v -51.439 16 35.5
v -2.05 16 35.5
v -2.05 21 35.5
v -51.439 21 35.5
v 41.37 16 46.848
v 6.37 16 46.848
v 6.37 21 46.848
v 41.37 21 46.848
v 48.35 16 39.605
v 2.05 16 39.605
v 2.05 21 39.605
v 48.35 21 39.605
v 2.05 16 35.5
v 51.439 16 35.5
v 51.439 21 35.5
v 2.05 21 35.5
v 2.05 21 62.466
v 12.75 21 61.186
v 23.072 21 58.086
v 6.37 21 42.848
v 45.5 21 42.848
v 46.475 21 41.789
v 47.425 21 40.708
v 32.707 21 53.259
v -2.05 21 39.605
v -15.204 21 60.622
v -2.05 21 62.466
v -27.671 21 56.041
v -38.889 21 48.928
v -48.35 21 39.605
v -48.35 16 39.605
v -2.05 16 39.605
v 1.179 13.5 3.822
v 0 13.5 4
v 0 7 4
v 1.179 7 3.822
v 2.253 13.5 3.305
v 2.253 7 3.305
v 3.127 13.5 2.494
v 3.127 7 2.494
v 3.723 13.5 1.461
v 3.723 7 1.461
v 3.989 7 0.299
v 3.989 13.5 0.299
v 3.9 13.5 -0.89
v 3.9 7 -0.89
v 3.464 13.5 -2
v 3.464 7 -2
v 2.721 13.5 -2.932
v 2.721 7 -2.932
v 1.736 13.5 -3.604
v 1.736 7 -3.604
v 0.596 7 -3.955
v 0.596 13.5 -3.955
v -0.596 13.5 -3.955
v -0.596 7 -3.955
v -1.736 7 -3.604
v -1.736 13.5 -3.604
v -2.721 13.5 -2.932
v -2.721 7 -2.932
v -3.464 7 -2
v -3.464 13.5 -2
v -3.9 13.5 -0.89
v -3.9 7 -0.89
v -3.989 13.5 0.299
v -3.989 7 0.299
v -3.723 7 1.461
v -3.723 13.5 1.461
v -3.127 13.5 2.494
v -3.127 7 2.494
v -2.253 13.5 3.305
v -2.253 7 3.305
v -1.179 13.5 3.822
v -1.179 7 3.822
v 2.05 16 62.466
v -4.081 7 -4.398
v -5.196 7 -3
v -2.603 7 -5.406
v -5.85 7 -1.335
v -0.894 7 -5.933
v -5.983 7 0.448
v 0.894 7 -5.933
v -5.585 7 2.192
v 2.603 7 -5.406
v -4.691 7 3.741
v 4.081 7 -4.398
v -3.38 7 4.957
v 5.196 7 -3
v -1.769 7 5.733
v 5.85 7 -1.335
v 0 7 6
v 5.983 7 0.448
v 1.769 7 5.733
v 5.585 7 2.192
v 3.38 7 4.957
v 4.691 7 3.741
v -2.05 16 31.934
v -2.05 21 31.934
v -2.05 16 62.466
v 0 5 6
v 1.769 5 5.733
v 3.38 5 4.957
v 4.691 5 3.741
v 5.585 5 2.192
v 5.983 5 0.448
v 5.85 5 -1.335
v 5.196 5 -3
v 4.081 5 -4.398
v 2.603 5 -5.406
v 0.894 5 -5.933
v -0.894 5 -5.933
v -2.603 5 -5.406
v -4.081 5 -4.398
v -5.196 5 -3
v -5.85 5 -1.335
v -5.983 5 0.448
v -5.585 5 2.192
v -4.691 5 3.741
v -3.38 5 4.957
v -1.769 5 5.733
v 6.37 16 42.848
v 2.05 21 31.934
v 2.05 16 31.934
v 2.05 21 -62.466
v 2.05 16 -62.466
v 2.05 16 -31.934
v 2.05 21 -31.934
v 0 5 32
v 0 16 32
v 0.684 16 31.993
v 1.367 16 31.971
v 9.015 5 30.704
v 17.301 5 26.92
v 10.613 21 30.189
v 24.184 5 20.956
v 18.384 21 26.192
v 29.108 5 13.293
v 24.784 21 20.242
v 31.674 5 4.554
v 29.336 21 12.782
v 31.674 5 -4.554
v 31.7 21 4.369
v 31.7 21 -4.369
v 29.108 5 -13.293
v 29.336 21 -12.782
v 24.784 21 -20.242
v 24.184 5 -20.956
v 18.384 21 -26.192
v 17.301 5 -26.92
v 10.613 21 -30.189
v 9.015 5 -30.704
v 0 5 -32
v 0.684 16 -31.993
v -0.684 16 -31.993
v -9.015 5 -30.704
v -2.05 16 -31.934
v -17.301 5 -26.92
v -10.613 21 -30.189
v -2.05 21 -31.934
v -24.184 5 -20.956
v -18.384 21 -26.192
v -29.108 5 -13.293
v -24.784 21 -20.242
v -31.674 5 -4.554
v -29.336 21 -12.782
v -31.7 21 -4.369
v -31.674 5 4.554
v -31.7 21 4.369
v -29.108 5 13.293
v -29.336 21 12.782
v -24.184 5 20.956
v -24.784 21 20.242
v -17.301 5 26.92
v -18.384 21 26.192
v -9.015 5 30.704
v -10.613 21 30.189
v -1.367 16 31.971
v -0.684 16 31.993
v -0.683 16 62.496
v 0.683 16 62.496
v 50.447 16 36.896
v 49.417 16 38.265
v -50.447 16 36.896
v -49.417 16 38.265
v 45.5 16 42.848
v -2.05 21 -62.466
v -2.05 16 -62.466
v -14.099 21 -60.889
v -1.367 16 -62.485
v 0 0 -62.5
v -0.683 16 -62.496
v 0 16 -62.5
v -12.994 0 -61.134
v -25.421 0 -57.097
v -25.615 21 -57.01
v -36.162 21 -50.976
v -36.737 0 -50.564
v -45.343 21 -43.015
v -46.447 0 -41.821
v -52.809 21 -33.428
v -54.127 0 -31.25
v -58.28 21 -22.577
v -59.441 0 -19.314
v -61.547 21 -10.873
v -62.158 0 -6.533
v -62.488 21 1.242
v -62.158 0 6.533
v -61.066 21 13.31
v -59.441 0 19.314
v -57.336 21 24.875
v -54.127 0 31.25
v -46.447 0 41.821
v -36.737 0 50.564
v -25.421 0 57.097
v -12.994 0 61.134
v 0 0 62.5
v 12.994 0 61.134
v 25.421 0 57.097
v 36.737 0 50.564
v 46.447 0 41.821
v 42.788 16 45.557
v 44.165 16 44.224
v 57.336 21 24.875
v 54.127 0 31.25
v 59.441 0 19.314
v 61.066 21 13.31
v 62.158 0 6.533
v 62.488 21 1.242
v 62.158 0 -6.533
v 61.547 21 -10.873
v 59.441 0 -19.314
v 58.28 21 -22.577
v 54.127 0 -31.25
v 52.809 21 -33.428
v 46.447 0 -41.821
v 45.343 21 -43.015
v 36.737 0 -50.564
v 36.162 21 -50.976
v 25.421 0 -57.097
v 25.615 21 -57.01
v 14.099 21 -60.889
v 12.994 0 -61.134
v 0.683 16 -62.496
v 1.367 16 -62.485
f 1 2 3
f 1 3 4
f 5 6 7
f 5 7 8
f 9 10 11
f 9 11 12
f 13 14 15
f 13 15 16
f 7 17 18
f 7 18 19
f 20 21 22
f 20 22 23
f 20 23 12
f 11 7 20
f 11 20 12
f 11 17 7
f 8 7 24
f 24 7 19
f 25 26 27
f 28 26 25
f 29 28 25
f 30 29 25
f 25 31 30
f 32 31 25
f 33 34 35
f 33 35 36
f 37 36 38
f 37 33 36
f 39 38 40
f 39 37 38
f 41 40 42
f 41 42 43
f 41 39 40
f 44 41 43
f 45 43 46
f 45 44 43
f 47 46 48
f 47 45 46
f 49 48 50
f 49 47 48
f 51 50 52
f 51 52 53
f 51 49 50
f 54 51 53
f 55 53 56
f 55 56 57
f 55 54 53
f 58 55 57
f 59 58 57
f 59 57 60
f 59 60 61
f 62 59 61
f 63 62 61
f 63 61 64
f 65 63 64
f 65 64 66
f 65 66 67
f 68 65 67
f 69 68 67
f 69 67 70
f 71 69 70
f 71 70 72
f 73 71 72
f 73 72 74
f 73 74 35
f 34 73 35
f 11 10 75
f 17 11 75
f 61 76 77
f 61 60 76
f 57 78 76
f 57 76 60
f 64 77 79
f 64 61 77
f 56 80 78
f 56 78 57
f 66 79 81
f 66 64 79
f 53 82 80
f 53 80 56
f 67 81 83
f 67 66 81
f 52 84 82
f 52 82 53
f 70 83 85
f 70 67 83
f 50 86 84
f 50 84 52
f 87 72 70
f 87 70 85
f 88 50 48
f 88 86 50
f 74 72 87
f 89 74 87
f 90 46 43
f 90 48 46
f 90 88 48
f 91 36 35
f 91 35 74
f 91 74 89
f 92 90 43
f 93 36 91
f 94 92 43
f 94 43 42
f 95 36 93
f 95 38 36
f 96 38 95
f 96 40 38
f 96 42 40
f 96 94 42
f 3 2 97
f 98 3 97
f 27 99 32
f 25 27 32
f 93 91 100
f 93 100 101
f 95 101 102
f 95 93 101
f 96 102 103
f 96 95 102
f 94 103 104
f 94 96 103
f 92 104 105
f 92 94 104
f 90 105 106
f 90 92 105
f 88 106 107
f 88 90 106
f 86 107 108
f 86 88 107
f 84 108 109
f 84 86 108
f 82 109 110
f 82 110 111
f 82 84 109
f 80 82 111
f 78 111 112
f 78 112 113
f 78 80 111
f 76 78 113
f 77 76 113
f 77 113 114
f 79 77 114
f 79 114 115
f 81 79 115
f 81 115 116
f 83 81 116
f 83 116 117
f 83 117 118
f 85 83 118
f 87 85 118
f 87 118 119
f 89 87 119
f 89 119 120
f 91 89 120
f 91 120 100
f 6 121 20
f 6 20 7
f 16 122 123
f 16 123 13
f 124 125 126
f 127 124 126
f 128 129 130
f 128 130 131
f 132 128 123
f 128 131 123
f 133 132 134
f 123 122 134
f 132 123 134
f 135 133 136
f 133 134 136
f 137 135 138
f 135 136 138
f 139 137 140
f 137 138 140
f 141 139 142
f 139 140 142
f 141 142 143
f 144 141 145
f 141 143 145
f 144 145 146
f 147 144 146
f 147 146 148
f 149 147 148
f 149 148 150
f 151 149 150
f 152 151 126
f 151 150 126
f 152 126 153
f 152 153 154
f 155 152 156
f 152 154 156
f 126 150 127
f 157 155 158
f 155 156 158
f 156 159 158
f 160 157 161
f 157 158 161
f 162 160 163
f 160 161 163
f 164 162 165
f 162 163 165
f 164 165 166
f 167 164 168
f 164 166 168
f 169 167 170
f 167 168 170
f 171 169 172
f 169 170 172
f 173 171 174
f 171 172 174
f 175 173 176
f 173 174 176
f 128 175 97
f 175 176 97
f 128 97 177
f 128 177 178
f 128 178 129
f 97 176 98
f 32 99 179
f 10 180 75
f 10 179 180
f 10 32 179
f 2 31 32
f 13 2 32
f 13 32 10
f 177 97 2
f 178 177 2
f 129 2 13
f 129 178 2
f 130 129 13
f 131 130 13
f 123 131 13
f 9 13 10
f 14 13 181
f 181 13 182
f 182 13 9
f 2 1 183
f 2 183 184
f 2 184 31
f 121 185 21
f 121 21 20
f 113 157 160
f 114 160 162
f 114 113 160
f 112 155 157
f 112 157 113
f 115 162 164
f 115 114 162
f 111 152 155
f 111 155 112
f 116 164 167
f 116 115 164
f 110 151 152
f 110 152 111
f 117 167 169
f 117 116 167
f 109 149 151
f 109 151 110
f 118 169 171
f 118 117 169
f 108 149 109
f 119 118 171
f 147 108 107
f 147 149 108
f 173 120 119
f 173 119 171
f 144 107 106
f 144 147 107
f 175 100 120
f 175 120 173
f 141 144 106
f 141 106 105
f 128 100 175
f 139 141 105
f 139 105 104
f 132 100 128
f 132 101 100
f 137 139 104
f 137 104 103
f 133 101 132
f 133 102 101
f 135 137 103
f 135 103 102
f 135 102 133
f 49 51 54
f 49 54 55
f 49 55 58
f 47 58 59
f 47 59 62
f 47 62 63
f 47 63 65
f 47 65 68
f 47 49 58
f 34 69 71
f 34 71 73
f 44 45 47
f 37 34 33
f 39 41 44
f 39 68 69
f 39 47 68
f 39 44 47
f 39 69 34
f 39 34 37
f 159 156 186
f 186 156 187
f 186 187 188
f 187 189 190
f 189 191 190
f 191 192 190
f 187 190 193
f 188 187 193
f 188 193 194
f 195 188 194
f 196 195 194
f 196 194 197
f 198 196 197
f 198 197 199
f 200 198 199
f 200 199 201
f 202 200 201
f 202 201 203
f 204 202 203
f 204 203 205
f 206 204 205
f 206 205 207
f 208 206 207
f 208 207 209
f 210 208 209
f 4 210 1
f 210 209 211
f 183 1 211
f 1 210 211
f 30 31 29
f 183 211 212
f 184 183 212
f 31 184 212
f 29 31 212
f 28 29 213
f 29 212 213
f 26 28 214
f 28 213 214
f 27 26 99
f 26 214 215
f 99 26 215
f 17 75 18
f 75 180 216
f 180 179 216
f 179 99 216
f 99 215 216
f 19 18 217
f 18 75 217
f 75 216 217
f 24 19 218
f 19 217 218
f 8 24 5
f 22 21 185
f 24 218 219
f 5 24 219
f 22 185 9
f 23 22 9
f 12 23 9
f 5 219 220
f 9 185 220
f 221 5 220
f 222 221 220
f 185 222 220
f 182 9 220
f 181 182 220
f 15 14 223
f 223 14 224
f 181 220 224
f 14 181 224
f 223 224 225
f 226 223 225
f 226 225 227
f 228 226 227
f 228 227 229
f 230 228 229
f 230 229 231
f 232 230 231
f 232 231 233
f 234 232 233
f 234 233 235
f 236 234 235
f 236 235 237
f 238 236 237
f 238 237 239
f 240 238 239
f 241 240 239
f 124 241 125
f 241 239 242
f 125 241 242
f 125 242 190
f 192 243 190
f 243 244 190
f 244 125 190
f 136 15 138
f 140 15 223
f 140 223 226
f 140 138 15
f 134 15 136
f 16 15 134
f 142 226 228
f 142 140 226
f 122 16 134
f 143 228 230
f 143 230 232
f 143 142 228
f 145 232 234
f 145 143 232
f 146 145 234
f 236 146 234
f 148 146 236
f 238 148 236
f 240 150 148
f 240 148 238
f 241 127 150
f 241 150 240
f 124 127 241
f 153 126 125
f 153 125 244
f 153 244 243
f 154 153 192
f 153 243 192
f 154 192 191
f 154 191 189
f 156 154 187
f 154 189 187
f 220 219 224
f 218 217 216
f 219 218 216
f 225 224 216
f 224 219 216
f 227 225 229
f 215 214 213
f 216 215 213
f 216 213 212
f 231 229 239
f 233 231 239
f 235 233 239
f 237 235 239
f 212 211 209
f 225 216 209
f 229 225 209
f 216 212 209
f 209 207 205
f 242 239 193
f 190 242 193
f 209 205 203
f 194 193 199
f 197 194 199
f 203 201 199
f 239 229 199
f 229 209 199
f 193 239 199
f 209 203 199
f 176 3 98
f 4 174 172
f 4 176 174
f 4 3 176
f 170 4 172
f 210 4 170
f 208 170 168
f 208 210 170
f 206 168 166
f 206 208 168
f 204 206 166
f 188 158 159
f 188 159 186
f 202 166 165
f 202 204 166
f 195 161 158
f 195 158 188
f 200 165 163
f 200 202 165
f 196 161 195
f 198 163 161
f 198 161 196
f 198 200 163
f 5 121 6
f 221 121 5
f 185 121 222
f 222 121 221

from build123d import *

# Parameters (mm, degrees)
SKETCH1_R           = 62.5
BOSS_EXTRUDE1_DEPTH = 21
SKETCH2_R           = 32
SKETCH2_R_2         = 6
CUT_EXTRUDE1_DEPTH  = 16
SKETCH3_R           = 6
SKETCH3_R_2         = 4
CUT_EXTRUDE2_DEPTH  = 14
SKETCH4_R           = 4
CUT_EXTRUDE3_DEPTH  = 7.5
CUT_EXTRUDE4_START  = -5
CUT_EXTRUDE4_DEPTH  = 5
CUT_EXTRUDE5_START  = -5
CUT_EXTRUDE5_DEPTH  = 5
CUT_EXTRUDE6_START  = -5
CUT_EXTRUDE6_DEPTH  = 5


with BuildPart() as part:
    # Sketch1 → Boss-Extrude1 (new body)
    with BuildSketch(Plane(origin=(0, 0, 0), x_dir=(1, 0, 0), z_dir=(0, 1, 0))):
        Circle(SKETCH1_R)
    extrude(amount=BOSS_EXTRUDE1_DEPTH)

    # Sketch2 → Cut-Extrude1 (cut)
    with BuildSketch(Plane(origin=(0, 21, 0), x_dir=(1, 0, 0), z_dir=(0, 1, 0))):
        Circle(SKETCH2_R)
        Circle(SKETCH2_R_2, mode=Mode.SUBTRACT)
    extrude(amount=-CUT_EXTRUDE1_DEPTH, mode=Mode.SUBTRACT)

    # Sketch3 → Cut-Extrude2 (cut)
    with BuildSketch(Plane(origin=(0, 21, 0), x_dir=(1, 0, 0), z_dir=(0, 1, 0))):
        Circle(SKETCH3_R)
        Circle(SKETCH3_R_2, mode=Mode.SUBTRACT)
    extrude(amount=-CUT_EXTRUDE2_DEPTH, mode=Mode.SUBTRACT)

    # Sketch4 → Cut-Extrude3 (cut)
    with BuildSketch(Plane(origin=(0, 21, 0), x_dir=(1, 0, 0), z_dir=(0, 1, 0))):
        Circle(SKETCH4_R)
    extrude(amount=-CUT_EXTRUDE3_DEPTH, mode=Mode.SUBTRACT)

    # Sketch5 → Cut-Extrude4 (cut)
    with BuildSketch(Plane(origin=(0, 21, 0), x_dir=(1, 0, 0), z_dir=(0, 1, 0)).offset(CUT_EXTRUDE4_START)):
        with BuildLine():
            Line((2.05, 62.466370953), (2.05, -62.466370953))
            ThreePointArc((2.05, -62.466370953), (0, -62.5), (-2.05, -62.466370953))
            Line((-2.05, -62.466370953), (-2.05, 62.466370953))
            ThreePointArc((-2.05, 62.466370953), (0, 62.5), (2.05, 62.466370953))
        make_face()
    extrude(amount=CUT_EXTRUDE4_DEPTH, mode=Mode.SUBTRACT)

    # Sketch6 → Cut-Extrude5 (cut)
    with BuildSketch(Plane(origin=(0, 21, 0), x_dir=(1, 0, 0), z_dir=(0, 1, 0)).offset(CUT_EXTRUDE5_START)):
        with BuildLine():
            Line((-48.35, -39.60463988), (48.35, -39.60463988))
            ThreePointArc((48.35, -39.60463988), (49.936833573, -37.584074456), (51.439284598, -35.5))
            Line((51.439284598, -35.5), (-51.439284598, -35.5))
            ThreePointArc((-51.439284598, -35.5), (-49.936833573, -37.584074456), (-48.35, -39.60463988))
        make_face()
    extrude(amount=CUT_EXTRUDE5_DEPTH, mode=Mode.SUBTRACT)

    # Sketch9 → Cut-Extrude6 (cut)
    with BuildSketch(Plane(origin=(0, 21, 0), x_dir=(1, 0, 0), z_dir=(0, 1, 0)).offset(CUT_EXTRUDE6_START)):
        with BuildLine():
            Line((45.500273824, -42.848279801), (6.37014237, -42.848279801))
            Line((6.37014237, -42.848279801), (6.37014237, -46.848279801))
            Line((6.37014237, -46.848279801), (41.37014237, -46.848279801))
            ThreePointArc((41.37014237, -46.848279801), (43.481229311, -44.895798217), (45.500273824, -42.848279801))
        make_face()
    extrude(amount=CUT_EXTRUDE6_DEPTH, mode=Mode.SUBTRACT)


solid = part.part
